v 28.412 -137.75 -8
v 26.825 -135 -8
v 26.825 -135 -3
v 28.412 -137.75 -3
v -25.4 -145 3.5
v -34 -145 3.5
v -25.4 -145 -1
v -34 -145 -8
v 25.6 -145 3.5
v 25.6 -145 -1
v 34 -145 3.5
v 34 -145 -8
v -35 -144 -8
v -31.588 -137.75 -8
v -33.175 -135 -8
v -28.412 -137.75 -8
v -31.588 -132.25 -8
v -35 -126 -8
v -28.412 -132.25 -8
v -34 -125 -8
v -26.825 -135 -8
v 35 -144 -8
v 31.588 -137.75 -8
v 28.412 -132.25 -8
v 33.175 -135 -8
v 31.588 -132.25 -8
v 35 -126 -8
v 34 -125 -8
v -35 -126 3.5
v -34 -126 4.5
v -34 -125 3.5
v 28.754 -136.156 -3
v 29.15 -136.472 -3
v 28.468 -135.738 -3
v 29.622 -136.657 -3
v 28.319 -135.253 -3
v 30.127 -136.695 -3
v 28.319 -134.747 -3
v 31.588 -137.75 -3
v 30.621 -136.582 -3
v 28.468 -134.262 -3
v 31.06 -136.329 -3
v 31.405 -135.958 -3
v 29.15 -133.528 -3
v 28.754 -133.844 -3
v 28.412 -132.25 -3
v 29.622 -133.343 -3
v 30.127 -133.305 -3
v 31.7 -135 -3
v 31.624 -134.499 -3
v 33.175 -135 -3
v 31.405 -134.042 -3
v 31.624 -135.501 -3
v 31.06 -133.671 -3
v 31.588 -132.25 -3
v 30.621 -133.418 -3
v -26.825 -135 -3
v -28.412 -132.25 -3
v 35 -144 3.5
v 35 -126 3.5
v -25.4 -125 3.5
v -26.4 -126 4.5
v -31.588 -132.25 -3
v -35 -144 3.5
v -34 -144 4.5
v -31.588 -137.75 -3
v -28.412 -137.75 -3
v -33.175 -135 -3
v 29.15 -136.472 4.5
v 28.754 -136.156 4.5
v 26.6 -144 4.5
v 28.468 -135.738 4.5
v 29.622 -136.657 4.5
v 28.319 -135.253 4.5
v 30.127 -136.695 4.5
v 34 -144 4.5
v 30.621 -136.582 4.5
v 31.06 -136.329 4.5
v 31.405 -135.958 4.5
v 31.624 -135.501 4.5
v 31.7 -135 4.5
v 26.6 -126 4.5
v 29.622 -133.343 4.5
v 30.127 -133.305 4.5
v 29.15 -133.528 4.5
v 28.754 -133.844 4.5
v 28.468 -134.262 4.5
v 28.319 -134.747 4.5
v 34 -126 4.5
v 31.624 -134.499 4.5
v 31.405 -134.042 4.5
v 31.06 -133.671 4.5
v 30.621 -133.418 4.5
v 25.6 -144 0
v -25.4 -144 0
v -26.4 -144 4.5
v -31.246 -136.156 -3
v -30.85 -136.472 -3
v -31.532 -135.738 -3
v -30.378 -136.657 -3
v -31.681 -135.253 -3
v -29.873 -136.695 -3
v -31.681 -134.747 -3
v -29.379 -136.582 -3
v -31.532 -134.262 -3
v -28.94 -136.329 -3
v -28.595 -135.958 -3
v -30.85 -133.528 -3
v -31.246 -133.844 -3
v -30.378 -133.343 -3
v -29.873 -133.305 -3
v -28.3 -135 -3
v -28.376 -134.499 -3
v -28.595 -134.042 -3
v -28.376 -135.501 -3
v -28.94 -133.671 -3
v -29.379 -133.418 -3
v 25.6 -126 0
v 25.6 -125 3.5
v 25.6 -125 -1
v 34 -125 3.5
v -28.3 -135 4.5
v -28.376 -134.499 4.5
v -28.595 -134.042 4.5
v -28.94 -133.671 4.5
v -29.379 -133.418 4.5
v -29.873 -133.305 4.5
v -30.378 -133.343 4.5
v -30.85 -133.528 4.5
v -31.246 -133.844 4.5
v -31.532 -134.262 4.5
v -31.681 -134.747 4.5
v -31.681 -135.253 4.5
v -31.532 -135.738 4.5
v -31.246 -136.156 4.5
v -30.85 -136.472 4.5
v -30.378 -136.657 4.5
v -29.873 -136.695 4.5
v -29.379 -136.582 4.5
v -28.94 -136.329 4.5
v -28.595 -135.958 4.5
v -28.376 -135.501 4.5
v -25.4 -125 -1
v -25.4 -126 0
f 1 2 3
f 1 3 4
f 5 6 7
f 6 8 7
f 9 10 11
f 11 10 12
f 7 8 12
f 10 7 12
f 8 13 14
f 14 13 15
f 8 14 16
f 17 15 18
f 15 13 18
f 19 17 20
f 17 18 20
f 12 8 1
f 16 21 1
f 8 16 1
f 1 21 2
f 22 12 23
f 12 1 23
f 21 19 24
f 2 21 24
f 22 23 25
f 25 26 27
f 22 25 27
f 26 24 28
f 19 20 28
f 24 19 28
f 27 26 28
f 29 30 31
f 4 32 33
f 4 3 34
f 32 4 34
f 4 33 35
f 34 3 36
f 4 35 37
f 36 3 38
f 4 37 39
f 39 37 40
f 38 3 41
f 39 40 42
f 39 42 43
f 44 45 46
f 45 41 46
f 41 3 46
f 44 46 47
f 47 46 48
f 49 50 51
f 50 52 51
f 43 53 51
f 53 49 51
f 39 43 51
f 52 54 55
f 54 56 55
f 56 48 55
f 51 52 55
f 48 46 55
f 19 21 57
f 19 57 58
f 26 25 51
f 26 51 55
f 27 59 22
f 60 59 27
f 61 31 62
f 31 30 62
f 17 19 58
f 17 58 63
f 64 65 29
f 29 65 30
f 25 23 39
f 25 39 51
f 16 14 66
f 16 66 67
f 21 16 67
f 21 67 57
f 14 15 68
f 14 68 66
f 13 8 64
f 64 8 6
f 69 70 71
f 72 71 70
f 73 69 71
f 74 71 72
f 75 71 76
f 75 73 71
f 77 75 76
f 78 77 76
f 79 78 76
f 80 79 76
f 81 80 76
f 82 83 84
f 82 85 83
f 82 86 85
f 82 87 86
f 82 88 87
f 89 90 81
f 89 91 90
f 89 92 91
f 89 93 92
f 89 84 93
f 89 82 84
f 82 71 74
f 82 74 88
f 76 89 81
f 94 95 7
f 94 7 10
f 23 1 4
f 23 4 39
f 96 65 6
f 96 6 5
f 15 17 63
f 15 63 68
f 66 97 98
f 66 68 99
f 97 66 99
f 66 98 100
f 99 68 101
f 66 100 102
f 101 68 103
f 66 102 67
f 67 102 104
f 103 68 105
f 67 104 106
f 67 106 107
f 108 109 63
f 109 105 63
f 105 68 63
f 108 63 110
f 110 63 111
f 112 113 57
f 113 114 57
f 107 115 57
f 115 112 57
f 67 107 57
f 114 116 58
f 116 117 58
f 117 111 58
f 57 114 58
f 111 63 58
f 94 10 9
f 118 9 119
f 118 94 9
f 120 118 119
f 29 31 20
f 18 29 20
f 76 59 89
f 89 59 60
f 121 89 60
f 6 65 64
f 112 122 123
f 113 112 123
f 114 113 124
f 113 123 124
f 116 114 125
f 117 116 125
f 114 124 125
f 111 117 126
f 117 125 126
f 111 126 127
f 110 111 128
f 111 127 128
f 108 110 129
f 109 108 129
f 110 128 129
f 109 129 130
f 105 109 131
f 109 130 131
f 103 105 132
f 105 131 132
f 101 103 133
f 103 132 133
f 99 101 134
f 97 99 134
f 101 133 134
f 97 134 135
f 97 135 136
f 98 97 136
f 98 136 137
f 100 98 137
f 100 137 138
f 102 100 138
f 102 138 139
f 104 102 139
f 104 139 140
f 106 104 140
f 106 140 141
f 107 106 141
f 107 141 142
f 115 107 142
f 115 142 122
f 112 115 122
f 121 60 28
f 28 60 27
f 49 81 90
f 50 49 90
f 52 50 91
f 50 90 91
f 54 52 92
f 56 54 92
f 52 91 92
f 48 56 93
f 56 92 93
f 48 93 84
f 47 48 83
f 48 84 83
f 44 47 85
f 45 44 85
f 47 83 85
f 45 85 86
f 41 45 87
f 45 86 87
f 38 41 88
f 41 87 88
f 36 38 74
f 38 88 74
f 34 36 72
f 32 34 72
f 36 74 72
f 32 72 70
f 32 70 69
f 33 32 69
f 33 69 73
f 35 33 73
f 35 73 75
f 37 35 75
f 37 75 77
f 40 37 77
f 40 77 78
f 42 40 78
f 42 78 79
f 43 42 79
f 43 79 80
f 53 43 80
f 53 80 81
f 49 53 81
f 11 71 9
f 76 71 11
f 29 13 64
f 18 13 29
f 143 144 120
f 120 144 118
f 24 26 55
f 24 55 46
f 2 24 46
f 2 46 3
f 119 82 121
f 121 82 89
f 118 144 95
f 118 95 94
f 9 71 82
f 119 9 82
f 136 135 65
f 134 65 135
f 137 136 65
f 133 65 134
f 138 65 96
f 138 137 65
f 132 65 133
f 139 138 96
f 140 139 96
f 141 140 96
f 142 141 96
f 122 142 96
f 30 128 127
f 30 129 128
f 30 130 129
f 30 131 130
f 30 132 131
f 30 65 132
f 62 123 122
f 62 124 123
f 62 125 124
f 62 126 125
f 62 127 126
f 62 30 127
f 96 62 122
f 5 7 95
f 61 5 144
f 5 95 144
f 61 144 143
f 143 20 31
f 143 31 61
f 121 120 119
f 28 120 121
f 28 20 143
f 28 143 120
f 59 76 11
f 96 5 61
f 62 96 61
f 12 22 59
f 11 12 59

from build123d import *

# Parameters (mm, degrees)
SKETCH023_W     = 70
SKETCH023_H     = 20
PAD012_DEPTH    = 8
SKETCH024_W     = 9.6
SKETCH024_H     = 20
SKETCH024_W_2   = 9.4
PAD013_DEPTH    = 12.5
SKETCH025_R     = 1.7
HOLE003_DEPTH   = 25
POCKET002_DEPTH = 5
CHAMFER004_SIZE = 1


with BuildPart() as part:
    # Sketch023 → Pad012 (new body)
    with BuildSketch(Plane.XY):
        with Locations((0, -110)):
            Rectangle(SKETCH023_W, SKETCH023_H)
    extrude(amount=-PAD012_DEPTH)

    # Sketch024 → Pad013 (join)
    with BuildSketch(Plane.XY.offset(-8)):
        with Locations((-30.2, -110)):
            Rectangle(SKETCH024_W, SKETCH024_H)
        with Locations((30.3, -110)):
            Rectangle(SKETCH024_W_2, SKETCH024_H)
    extrude(amount=PAD013_DEPTH)

    # Sketch025 → Hole003 (cut)
    with BuildSketch(Plane.XY.offset(5)):
        with Locations((-30, -110)):
            Circle(SKETCH025_R)
        with Locations((30, -110)):
            Circle(SKETCH025_R)
    extrude(amount=-HOLE003_DEPTH, mode=Mode.SUBTRACT)

    # Sketch026 → Pocket002 (cut)
    with BuildSketch(Plane.XY.offset(-8)):
        Polygon((-28.412287, -112.75), (-26.824574, -110), (-28.412287, -107.25), (-31.587713, -107.25), (-33.175426, -110), (-31.587713, -112.75), align=None)
        Polygon((31.587713, -112.75), (33.175426, -110), (31.587713, -107.25), (28.412287, -107.25), (26.824574, -110), (28.412287, -112.75), align=None)
    extrude(amount=POCKET002_DEPTH, mode=Mode.SUBTRACT)

    # Chamfer004
    chamfer004_edges = [part.edges().sort_by_distance(p)[0] for p in [
        (-25.4, -110, 4.5),
        (25.6, -110, 4.5),
        (-30.2, -100, 4.5),
        (-35, -110, 4.5),
        (30.3, -100, 4.5),
        (35, -110, 4.5),
        (-30.2, -120, 4.5),
        (30.3, -120, 4.5),
        (0.1, -120, 0),
        (0.1, -100, 0),
        (-35, -120, -4),
        (-35, -100, -4),
        (35, -120, -4),
        (35, -100, -4),
    ]]
    chamfer(chamfer004_edges, length=CHAMFER004_SIZE)


with BuildPart() as part_1:
    # Body003 placement: moved
    add(part.part.moved(Location((0, -25, 0))))


solid = part_1.part
